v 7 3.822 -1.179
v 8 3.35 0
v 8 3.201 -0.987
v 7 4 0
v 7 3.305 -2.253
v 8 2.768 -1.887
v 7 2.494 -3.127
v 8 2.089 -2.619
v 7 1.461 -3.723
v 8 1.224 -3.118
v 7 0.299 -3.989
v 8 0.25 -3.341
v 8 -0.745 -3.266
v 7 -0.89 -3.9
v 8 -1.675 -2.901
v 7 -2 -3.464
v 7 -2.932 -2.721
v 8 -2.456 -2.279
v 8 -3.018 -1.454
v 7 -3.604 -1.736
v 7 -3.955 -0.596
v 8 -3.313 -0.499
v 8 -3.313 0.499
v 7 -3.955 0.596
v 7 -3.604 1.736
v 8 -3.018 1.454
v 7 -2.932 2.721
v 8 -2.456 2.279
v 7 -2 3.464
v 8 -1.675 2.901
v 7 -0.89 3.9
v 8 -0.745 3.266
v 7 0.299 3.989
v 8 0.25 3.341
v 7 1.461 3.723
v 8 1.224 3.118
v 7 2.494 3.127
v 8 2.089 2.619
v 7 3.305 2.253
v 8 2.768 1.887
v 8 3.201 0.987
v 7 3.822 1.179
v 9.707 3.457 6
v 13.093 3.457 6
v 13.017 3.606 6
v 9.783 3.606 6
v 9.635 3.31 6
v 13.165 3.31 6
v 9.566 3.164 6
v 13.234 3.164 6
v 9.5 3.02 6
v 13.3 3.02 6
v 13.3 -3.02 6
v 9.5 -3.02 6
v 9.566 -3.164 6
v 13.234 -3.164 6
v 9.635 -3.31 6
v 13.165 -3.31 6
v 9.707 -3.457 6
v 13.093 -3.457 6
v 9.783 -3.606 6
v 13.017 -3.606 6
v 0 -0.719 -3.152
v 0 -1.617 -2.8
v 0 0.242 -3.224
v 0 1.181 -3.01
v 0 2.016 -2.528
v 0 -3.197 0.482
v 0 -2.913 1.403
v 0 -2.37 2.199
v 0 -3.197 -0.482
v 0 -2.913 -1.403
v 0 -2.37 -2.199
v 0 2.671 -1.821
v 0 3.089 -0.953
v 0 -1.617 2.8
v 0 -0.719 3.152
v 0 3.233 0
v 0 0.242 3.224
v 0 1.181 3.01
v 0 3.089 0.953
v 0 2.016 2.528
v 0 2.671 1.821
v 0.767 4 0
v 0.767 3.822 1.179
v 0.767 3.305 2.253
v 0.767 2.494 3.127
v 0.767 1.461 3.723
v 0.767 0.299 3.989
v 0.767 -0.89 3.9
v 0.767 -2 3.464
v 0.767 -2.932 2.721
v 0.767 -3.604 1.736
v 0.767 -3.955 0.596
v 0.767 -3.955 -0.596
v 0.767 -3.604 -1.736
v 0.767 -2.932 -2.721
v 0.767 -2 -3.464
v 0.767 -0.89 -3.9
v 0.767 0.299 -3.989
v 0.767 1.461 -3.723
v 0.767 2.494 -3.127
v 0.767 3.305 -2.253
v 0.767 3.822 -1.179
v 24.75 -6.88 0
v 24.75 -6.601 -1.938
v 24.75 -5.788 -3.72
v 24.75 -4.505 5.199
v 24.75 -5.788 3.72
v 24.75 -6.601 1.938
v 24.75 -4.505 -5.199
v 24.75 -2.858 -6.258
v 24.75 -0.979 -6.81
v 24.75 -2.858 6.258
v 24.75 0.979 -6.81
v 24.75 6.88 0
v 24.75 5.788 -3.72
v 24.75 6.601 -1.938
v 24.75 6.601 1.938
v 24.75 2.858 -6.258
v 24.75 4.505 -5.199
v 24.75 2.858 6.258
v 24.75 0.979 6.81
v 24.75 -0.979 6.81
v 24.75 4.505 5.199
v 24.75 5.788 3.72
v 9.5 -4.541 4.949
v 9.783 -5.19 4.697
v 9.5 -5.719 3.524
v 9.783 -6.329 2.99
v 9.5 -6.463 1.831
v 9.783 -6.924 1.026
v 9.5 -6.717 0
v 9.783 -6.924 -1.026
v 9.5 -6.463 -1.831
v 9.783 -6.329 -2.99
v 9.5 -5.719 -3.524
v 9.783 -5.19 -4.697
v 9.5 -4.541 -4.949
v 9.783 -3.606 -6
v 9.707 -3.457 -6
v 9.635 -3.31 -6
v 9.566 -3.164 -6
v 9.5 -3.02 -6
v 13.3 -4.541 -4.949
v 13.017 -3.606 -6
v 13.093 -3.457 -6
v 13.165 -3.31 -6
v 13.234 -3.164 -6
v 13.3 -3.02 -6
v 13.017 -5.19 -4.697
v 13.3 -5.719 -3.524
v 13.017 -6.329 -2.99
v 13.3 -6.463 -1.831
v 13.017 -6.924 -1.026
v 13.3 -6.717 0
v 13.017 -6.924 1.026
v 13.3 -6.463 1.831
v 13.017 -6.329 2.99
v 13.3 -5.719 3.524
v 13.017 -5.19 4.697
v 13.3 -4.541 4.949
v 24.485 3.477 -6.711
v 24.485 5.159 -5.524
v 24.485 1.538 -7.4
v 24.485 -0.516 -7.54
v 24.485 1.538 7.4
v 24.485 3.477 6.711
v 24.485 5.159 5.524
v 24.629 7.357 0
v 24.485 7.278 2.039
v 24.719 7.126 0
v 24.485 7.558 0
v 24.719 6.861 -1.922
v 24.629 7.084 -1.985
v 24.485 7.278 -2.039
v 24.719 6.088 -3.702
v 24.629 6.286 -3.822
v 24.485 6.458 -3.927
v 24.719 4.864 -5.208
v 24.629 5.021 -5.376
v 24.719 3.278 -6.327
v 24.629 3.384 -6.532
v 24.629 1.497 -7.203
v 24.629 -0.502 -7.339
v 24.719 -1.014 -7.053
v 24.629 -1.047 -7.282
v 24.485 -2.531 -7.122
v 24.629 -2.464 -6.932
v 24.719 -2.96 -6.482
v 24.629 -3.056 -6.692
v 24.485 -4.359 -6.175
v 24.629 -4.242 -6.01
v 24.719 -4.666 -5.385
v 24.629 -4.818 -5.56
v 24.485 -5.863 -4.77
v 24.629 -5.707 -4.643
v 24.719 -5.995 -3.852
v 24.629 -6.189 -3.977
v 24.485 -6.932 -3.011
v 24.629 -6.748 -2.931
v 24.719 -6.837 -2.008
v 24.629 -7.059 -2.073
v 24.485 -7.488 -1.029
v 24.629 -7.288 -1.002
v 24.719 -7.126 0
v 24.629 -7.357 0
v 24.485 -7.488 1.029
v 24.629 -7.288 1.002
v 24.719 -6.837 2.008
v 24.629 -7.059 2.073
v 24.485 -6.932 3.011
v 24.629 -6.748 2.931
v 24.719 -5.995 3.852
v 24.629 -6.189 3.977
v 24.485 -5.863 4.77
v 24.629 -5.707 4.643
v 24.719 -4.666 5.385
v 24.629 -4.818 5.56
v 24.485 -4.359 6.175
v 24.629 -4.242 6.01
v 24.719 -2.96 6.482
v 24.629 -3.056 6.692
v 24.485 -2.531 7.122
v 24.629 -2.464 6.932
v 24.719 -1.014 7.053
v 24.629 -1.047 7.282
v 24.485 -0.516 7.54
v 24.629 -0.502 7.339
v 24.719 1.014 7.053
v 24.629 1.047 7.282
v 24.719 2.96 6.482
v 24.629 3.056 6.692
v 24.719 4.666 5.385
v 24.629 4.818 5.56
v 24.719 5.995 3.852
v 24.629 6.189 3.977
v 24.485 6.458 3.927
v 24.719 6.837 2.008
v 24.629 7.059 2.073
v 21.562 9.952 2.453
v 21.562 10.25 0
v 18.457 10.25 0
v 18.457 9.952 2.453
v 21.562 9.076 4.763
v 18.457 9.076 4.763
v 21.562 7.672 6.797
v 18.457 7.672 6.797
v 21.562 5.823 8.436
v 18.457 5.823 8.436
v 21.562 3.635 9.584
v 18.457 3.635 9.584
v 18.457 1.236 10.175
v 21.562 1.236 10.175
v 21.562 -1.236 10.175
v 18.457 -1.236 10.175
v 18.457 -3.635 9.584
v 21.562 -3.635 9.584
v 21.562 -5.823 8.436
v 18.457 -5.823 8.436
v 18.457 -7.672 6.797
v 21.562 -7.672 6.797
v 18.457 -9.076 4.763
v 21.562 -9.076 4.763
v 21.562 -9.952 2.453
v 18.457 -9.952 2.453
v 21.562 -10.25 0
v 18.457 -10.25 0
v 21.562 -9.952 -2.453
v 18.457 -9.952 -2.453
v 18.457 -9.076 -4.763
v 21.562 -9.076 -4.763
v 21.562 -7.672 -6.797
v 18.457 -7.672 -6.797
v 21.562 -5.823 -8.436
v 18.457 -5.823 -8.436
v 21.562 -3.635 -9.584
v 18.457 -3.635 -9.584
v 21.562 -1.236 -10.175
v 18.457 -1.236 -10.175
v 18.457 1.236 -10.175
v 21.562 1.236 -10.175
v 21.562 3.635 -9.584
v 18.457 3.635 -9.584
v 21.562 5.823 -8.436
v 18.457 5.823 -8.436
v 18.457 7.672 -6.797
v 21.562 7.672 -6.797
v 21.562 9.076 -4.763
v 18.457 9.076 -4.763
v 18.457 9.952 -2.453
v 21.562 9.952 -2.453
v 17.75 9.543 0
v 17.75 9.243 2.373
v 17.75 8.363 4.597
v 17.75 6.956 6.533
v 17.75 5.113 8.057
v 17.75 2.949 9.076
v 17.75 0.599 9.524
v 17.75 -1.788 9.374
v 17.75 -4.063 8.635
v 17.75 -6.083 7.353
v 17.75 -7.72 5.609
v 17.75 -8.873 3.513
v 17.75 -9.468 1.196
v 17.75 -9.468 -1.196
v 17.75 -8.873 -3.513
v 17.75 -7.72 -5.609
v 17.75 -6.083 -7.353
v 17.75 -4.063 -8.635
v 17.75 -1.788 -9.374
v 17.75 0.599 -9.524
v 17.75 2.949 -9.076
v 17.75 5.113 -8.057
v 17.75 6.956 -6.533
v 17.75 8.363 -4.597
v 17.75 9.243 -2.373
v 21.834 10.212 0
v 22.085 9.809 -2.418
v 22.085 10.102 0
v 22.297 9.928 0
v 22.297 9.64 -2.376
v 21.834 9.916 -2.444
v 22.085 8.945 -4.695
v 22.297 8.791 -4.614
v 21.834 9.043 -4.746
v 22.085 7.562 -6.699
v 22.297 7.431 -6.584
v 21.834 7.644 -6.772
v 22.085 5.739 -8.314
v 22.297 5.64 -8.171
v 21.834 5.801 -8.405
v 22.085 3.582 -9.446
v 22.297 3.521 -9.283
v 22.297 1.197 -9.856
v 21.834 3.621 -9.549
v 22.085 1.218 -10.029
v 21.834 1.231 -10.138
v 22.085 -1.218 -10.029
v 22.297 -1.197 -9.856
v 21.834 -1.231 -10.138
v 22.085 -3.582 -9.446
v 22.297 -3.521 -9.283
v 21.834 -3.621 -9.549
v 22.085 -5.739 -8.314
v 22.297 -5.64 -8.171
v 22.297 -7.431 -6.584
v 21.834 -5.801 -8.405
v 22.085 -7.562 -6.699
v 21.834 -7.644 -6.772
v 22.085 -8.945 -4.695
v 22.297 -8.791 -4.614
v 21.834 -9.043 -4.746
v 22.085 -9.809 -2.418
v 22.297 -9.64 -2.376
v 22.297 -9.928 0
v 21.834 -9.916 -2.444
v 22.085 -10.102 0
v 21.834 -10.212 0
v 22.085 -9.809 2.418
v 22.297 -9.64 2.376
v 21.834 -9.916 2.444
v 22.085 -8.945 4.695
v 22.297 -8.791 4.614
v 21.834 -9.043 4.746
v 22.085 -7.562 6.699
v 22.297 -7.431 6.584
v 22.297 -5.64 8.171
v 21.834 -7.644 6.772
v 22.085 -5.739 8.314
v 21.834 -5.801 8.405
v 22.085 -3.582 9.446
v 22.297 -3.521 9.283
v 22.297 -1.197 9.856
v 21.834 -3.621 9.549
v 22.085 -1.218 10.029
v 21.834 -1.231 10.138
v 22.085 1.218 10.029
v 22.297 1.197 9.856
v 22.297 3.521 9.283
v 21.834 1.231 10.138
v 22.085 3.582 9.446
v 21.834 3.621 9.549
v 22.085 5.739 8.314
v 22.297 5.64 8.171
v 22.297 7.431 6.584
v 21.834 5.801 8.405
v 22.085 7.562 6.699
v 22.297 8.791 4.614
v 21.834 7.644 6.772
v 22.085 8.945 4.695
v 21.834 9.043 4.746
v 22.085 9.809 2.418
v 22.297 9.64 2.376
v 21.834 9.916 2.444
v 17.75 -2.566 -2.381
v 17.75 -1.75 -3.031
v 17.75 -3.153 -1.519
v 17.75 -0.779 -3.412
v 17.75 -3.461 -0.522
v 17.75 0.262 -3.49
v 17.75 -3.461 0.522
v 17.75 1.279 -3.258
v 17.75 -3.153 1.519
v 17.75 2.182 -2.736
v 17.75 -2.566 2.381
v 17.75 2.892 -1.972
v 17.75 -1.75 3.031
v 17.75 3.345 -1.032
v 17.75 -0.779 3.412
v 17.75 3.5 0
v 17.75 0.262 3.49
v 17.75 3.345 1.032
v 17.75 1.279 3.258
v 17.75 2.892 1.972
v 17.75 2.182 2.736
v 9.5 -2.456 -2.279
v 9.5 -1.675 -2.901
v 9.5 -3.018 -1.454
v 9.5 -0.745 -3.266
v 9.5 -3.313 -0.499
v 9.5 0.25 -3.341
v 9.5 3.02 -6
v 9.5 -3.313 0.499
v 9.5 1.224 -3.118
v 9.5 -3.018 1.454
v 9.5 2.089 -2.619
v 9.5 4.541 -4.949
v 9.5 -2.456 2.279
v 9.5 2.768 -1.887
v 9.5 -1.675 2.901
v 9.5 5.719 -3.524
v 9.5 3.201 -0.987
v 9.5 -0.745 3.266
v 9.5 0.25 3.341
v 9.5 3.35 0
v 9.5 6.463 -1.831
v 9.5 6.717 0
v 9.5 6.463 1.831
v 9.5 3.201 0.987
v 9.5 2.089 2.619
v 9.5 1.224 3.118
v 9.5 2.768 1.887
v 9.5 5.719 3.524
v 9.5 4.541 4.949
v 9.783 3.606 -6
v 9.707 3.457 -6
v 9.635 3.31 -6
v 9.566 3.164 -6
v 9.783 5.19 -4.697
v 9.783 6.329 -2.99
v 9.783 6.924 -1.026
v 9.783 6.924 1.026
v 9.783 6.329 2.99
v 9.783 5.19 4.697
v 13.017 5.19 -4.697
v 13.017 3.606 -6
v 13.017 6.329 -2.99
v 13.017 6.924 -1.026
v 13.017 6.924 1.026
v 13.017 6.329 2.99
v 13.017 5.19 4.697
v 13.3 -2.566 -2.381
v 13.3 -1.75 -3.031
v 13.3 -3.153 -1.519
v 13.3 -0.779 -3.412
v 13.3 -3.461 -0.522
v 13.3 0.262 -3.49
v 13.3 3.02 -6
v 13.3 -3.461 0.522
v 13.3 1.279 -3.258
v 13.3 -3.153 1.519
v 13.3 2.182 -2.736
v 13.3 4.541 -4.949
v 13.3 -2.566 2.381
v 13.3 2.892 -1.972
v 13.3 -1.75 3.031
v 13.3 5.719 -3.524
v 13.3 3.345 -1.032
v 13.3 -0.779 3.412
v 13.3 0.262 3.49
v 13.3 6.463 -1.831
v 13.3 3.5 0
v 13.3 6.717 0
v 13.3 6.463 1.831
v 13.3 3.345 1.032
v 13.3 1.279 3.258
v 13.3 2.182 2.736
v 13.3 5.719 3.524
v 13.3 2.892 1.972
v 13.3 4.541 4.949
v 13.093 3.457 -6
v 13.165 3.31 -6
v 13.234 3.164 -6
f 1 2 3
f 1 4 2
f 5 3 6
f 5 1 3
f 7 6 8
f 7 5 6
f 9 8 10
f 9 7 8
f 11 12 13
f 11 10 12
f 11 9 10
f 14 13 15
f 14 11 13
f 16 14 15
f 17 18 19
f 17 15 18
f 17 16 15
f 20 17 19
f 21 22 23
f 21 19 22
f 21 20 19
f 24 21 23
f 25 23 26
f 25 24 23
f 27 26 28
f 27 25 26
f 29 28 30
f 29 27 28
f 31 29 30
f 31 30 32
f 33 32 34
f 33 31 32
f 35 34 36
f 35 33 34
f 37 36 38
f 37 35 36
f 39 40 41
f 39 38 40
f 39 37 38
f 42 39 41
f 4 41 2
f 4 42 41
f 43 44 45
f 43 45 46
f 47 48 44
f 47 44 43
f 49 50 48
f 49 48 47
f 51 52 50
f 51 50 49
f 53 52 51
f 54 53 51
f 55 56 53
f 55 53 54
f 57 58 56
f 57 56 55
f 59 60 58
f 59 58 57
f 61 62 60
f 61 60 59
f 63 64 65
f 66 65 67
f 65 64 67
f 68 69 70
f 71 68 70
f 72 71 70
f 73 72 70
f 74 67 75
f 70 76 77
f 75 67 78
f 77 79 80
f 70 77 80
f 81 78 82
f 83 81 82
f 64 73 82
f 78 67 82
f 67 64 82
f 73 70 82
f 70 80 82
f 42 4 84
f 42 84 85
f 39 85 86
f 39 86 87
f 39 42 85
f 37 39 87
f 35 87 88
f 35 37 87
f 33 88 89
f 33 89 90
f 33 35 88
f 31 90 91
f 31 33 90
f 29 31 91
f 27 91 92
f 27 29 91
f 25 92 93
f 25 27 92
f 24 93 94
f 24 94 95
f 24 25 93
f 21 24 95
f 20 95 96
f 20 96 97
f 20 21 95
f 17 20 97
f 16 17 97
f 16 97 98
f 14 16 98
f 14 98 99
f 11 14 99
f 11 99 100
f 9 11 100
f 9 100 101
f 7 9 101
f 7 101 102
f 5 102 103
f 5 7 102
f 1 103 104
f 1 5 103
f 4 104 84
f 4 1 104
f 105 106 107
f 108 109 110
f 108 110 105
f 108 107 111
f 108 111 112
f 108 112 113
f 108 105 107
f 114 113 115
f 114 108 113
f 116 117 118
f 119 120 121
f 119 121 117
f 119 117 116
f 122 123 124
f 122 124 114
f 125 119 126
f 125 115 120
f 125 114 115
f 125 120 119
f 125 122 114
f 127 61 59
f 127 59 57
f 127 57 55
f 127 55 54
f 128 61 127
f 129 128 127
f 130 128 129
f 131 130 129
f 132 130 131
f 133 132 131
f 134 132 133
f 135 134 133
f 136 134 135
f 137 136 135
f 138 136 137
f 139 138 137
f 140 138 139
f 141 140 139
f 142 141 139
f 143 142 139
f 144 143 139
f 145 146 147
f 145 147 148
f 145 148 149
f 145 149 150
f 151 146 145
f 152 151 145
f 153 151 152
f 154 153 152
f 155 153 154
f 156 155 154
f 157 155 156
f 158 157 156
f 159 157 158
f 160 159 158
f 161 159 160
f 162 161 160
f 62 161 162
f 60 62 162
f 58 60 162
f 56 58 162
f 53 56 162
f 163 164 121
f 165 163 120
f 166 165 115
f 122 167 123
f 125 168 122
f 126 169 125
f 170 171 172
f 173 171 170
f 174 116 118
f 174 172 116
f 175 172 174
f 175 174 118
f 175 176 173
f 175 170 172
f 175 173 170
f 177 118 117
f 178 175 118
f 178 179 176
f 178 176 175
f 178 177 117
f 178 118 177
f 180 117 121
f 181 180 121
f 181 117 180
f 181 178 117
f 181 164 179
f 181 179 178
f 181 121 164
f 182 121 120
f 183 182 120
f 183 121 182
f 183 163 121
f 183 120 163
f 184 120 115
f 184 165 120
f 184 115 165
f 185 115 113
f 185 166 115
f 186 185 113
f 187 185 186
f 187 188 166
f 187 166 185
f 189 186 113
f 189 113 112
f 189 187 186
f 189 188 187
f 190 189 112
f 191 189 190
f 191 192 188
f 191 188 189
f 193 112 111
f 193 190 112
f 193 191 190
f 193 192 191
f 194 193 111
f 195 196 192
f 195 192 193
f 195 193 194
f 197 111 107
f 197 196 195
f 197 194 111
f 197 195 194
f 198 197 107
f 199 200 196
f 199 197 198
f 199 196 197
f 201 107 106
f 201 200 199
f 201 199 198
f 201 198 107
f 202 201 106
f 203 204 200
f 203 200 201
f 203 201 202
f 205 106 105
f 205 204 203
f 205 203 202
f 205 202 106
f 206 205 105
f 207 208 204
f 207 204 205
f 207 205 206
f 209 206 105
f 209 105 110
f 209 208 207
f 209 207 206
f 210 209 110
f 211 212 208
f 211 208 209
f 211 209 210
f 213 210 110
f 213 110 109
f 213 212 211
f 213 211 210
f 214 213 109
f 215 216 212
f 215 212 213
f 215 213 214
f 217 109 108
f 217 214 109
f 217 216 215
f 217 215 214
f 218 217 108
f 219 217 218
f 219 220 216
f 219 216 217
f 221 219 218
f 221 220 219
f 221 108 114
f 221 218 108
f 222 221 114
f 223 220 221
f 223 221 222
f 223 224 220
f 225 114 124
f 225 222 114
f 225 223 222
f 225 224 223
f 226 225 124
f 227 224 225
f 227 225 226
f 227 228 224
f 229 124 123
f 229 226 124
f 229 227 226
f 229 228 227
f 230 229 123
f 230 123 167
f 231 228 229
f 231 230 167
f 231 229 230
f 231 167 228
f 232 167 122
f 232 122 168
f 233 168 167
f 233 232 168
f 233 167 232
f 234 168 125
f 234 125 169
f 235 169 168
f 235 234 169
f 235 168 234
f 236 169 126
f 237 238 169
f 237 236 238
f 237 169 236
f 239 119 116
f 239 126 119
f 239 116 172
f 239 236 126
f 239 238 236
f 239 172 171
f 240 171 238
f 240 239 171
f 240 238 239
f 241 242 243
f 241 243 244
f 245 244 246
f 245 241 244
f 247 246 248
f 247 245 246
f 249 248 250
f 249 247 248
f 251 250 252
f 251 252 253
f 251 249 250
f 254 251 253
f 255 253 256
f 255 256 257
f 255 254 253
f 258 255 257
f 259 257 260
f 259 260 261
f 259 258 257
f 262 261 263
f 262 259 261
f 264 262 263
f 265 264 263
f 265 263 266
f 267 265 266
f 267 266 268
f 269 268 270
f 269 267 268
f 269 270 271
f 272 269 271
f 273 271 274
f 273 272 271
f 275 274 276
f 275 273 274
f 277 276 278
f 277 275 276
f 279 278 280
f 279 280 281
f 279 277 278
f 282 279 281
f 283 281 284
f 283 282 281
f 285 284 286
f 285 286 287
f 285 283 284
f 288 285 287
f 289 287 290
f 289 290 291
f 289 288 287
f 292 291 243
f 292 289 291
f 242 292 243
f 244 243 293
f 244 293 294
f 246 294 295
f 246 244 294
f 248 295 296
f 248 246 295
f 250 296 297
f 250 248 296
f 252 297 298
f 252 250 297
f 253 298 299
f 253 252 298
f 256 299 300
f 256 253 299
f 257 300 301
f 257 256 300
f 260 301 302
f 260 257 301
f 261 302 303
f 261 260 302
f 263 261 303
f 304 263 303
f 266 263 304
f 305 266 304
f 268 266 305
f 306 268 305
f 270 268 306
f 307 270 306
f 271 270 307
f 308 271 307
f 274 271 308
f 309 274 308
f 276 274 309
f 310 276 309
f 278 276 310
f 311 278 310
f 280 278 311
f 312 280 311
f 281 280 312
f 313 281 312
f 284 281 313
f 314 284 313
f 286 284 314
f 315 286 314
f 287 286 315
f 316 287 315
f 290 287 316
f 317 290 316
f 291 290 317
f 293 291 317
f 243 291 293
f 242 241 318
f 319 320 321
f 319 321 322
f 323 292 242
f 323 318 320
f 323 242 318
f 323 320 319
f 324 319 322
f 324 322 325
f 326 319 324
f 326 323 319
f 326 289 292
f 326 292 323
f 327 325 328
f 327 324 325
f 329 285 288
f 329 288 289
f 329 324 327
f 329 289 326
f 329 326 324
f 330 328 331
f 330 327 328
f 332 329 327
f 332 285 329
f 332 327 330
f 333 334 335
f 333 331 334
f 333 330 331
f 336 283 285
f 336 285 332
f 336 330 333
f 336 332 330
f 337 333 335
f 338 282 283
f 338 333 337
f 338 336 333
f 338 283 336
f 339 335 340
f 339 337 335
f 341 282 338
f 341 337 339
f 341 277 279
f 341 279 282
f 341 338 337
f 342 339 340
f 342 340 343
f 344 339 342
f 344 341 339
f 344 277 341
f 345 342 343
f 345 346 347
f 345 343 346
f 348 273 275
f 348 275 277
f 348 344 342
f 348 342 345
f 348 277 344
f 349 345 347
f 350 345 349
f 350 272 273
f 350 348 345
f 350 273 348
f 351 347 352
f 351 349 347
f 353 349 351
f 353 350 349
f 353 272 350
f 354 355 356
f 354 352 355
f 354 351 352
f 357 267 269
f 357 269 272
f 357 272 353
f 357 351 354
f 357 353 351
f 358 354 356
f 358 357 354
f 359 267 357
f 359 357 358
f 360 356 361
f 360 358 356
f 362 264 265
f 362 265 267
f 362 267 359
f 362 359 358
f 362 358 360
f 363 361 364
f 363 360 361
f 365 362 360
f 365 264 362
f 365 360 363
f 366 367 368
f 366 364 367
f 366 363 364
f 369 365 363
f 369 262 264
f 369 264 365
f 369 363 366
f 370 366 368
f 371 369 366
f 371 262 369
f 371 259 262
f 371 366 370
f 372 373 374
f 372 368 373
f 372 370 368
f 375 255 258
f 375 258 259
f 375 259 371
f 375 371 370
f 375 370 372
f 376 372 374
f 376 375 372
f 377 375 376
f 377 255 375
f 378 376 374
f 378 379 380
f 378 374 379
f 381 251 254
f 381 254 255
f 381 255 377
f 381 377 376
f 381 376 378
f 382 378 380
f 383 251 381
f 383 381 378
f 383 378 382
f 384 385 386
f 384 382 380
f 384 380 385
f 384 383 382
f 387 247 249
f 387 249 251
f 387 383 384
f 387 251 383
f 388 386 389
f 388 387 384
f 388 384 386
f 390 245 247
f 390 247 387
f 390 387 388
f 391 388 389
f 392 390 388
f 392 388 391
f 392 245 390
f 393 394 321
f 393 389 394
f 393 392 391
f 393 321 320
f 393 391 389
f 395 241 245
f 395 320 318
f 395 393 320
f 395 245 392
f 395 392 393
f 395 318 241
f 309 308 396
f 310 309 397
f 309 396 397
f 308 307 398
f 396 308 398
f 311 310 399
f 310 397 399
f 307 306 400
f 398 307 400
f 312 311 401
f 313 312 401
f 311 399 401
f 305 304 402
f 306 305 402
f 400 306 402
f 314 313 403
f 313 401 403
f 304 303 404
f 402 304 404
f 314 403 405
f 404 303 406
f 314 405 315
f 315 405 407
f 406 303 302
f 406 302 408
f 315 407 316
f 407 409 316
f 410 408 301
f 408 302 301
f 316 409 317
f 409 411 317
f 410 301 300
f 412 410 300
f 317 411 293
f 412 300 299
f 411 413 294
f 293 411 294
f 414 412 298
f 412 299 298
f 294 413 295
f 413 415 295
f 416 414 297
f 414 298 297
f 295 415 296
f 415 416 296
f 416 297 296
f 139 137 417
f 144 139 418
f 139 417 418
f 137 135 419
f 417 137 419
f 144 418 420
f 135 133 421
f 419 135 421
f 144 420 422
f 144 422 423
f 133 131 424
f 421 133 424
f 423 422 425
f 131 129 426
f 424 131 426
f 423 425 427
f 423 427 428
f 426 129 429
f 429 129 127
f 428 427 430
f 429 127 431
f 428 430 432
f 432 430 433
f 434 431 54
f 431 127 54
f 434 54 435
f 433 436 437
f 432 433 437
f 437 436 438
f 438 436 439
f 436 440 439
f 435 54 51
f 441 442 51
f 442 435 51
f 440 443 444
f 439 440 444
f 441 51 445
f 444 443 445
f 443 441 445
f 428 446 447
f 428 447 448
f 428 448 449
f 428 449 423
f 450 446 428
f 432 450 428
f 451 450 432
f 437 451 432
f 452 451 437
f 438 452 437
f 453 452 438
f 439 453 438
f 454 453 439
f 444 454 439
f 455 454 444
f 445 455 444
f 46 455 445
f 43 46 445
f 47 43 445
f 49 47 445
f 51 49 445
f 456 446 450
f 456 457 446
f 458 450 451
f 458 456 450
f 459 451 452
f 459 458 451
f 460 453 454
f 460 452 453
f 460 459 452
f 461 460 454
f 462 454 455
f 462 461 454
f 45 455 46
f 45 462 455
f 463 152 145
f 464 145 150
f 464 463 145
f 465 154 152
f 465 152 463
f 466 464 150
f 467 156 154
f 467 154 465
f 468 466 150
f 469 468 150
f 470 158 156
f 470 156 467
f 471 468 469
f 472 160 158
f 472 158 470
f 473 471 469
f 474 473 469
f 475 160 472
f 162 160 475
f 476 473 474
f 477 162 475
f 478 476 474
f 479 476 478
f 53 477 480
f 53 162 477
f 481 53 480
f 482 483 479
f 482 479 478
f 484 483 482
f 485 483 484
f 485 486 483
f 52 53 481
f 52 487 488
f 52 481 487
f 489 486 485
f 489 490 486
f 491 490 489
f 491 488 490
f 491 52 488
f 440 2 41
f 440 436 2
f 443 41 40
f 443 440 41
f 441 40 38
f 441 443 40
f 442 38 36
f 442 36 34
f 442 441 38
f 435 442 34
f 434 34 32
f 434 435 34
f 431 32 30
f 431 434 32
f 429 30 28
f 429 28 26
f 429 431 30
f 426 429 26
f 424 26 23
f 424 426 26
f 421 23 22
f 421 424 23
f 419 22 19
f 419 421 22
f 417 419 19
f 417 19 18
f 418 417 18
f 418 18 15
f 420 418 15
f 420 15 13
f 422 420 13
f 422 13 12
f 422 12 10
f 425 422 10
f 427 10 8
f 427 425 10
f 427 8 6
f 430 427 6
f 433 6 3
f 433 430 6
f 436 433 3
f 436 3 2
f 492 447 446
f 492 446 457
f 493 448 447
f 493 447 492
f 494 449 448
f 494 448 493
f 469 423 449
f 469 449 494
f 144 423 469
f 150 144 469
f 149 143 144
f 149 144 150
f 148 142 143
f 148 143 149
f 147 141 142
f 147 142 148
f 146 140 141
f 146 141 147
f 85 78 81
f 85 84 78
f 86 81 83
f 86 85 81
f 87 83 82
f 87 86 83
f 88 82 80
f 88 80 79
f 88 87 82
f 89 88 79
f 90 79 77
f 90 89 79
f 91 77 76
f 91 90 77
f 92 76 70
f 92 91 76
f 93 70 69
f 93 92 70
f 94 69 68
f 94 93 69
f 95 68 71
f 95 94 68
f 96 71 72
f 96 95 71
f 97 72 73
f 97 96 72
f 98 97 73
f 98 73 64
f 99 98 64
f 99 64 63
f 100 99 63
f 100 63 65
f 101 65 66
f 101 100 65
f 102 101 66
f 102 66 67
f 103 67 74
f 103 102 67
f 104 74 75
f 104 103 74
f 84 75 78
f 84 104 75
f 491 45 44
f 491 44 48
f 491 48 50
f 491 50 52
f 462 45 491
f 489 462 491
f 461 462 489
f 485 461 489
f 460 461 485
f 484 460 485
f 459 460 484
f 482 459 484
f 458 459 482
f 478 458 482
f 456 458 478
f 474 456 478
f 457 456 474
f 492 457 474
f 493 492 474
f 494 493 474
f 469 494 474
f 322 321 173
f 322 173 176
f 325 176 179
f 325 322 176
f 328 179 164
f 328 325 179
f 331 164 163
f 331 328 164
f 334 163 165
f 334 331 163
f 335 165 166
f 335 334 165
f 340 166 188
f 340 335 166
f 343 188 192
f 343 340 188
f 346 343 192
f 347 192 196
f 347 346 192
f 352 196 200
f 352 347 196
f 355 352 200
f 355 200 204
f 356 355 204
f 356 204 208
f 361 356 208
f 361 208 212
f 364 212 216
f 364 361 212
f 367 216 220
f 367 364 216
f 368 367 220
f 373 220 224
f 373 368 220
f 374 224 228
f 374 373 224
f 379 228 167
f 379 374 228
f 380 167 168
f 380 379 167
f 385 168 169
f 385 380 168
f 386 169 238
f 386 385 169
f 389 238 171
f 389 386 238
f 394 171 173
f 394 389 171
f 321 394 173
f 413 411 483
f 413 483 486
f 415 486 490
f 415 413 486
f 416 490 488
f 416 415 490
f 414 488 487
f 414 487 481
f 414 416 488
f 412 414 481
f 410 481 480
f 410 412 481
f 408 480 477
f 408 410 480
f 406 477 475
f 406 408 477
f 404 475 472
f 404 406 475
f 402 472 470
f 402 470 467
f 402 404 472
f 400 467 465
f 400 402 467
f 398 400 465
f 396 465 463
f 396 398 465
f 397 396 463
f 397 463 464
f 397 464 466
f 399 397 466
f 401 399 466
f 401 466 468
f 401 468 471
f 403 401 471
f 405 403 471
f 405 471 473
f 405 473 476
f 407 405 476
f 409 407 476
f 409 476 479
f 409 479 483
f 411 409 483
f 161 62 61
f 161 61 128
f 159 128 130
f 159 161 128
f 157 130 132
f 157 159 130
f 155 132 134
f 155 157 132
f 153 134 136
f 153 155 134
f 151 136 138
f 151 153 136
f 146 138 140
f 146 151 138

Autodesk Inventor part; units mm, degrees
sketch "Skizze_1" plane through (0, 0, 0) normal (0, 0, 1) x (1, 0, 0)
  line L0 (24.75, 0) -> (0, 0)
  line L1 (0, 0) -> (0, 3.233)
  line L2 (0, 3.233) -> (0.767, 4)
  line L3 (0.767, 4) -> (7, 4)
  line L4 (7, 4) -> (8, 3.35)
  line L5 (8, 3.35) -> (9.5, 3.35)
  line L6 (9.5, 3.35) -> (9.5, 6.7172)
  line L7 (9.5, 6.7172) -> (9.7828, 7)
  line L8 (9.7828, 7) -> (13.0172, 7)
  line L9 (13.0172, 7) -> (13.3, 6.7172)
  line L10 (13.3, 6.7172) -> (13.3, 3.5)
  line L11 (13.3, 3.5) -> (17.75, 3.5)
  line L12 (17.75, 3.5) -> (17.75, 9.5429)
  line L13 (17.75, 9.5429) -> (18.4571, 10.25)
  line L14 (18.4571, 10.25) -> (21.5622, 10.25)
  arc A0 (22.297, 9.9283) -> (21.5622, 10.25) centre (21.5622, 9.25) ccw
  line L15 (22.297, 9.9283) -> (24.4848, 7.5581)
  arc A1 (24.75, 6.8798) -> (24.4848, 7.5581) centre (23.75, 6.8798) ccw
  line L16 (24.75, 6.8798) -> (24.75, 0)
  line L17 (24.75, 0) -> (0, 0)
revolve "Revolution1" add sketch "Skizze_1" angle 360 about axis through (24.75, 0, 0) along (1, 0, 0)
thread "Thread1" size "M8x1.25" class "6g" standard "ISO Metric profile" full length
sketch "Skizze_2" plane through (0, 0, 0) normal (0, 1, 0) x (-1, 0, 0)
  line L0 (-6, 6) -> (-6, 14)
  line L1 (-6, 14) -> (-14, 14)
  line L2 (-14, 14) -> (-14, 6)
  line L3 (-14, 6) -> (-6, 6)
extrude "Extrusion1" cut sketch "Skizze_2" along normal mid plane 10
sketch "Skizze_3" plane through (0, 0, 0) normal (0, 1, 0) x (-1, 0, 0)
  line L0 (-6, -14) -> (-6, -6)
  line L1 (-6, -6) -> (-14, -6)
  line L2 (-14, -6) -> (-14, -14)
  line L3 (-14, -14) -> (-6, -14)
extrude "Extrusion2" cut sketch "Skizze_3" along normal mid plane 10
ref_plane "side_1_XY" through (9.5, 0, 0) normal (-1, 0, 0) x (0, 0, -1)
ref_plane "side_1_YZ" through (9.5, 0, 0) normal (0, 0, -1) x (0, -1, 0)
ref_plane "side_1_ZX" through (9.5, 0, 0) normal (0, -1, 0) x (-1, 0, 0)
ref_plane "side_2_XY" through (14.6, 0, 0) normal (1, 0, 0) x (0, 0, -1)
ref_plane "side_2_YZ" through (14.6, 0, 0) normal (0, 0, -1) x (0, 1, 0)
ref_plane "side_2_ZX" through (14.6, 0, 0) normal (0, 1, 0) x (1, 0, 0)
properties part number "MayTec 1.67.42E3M8_Slot roller E3"
